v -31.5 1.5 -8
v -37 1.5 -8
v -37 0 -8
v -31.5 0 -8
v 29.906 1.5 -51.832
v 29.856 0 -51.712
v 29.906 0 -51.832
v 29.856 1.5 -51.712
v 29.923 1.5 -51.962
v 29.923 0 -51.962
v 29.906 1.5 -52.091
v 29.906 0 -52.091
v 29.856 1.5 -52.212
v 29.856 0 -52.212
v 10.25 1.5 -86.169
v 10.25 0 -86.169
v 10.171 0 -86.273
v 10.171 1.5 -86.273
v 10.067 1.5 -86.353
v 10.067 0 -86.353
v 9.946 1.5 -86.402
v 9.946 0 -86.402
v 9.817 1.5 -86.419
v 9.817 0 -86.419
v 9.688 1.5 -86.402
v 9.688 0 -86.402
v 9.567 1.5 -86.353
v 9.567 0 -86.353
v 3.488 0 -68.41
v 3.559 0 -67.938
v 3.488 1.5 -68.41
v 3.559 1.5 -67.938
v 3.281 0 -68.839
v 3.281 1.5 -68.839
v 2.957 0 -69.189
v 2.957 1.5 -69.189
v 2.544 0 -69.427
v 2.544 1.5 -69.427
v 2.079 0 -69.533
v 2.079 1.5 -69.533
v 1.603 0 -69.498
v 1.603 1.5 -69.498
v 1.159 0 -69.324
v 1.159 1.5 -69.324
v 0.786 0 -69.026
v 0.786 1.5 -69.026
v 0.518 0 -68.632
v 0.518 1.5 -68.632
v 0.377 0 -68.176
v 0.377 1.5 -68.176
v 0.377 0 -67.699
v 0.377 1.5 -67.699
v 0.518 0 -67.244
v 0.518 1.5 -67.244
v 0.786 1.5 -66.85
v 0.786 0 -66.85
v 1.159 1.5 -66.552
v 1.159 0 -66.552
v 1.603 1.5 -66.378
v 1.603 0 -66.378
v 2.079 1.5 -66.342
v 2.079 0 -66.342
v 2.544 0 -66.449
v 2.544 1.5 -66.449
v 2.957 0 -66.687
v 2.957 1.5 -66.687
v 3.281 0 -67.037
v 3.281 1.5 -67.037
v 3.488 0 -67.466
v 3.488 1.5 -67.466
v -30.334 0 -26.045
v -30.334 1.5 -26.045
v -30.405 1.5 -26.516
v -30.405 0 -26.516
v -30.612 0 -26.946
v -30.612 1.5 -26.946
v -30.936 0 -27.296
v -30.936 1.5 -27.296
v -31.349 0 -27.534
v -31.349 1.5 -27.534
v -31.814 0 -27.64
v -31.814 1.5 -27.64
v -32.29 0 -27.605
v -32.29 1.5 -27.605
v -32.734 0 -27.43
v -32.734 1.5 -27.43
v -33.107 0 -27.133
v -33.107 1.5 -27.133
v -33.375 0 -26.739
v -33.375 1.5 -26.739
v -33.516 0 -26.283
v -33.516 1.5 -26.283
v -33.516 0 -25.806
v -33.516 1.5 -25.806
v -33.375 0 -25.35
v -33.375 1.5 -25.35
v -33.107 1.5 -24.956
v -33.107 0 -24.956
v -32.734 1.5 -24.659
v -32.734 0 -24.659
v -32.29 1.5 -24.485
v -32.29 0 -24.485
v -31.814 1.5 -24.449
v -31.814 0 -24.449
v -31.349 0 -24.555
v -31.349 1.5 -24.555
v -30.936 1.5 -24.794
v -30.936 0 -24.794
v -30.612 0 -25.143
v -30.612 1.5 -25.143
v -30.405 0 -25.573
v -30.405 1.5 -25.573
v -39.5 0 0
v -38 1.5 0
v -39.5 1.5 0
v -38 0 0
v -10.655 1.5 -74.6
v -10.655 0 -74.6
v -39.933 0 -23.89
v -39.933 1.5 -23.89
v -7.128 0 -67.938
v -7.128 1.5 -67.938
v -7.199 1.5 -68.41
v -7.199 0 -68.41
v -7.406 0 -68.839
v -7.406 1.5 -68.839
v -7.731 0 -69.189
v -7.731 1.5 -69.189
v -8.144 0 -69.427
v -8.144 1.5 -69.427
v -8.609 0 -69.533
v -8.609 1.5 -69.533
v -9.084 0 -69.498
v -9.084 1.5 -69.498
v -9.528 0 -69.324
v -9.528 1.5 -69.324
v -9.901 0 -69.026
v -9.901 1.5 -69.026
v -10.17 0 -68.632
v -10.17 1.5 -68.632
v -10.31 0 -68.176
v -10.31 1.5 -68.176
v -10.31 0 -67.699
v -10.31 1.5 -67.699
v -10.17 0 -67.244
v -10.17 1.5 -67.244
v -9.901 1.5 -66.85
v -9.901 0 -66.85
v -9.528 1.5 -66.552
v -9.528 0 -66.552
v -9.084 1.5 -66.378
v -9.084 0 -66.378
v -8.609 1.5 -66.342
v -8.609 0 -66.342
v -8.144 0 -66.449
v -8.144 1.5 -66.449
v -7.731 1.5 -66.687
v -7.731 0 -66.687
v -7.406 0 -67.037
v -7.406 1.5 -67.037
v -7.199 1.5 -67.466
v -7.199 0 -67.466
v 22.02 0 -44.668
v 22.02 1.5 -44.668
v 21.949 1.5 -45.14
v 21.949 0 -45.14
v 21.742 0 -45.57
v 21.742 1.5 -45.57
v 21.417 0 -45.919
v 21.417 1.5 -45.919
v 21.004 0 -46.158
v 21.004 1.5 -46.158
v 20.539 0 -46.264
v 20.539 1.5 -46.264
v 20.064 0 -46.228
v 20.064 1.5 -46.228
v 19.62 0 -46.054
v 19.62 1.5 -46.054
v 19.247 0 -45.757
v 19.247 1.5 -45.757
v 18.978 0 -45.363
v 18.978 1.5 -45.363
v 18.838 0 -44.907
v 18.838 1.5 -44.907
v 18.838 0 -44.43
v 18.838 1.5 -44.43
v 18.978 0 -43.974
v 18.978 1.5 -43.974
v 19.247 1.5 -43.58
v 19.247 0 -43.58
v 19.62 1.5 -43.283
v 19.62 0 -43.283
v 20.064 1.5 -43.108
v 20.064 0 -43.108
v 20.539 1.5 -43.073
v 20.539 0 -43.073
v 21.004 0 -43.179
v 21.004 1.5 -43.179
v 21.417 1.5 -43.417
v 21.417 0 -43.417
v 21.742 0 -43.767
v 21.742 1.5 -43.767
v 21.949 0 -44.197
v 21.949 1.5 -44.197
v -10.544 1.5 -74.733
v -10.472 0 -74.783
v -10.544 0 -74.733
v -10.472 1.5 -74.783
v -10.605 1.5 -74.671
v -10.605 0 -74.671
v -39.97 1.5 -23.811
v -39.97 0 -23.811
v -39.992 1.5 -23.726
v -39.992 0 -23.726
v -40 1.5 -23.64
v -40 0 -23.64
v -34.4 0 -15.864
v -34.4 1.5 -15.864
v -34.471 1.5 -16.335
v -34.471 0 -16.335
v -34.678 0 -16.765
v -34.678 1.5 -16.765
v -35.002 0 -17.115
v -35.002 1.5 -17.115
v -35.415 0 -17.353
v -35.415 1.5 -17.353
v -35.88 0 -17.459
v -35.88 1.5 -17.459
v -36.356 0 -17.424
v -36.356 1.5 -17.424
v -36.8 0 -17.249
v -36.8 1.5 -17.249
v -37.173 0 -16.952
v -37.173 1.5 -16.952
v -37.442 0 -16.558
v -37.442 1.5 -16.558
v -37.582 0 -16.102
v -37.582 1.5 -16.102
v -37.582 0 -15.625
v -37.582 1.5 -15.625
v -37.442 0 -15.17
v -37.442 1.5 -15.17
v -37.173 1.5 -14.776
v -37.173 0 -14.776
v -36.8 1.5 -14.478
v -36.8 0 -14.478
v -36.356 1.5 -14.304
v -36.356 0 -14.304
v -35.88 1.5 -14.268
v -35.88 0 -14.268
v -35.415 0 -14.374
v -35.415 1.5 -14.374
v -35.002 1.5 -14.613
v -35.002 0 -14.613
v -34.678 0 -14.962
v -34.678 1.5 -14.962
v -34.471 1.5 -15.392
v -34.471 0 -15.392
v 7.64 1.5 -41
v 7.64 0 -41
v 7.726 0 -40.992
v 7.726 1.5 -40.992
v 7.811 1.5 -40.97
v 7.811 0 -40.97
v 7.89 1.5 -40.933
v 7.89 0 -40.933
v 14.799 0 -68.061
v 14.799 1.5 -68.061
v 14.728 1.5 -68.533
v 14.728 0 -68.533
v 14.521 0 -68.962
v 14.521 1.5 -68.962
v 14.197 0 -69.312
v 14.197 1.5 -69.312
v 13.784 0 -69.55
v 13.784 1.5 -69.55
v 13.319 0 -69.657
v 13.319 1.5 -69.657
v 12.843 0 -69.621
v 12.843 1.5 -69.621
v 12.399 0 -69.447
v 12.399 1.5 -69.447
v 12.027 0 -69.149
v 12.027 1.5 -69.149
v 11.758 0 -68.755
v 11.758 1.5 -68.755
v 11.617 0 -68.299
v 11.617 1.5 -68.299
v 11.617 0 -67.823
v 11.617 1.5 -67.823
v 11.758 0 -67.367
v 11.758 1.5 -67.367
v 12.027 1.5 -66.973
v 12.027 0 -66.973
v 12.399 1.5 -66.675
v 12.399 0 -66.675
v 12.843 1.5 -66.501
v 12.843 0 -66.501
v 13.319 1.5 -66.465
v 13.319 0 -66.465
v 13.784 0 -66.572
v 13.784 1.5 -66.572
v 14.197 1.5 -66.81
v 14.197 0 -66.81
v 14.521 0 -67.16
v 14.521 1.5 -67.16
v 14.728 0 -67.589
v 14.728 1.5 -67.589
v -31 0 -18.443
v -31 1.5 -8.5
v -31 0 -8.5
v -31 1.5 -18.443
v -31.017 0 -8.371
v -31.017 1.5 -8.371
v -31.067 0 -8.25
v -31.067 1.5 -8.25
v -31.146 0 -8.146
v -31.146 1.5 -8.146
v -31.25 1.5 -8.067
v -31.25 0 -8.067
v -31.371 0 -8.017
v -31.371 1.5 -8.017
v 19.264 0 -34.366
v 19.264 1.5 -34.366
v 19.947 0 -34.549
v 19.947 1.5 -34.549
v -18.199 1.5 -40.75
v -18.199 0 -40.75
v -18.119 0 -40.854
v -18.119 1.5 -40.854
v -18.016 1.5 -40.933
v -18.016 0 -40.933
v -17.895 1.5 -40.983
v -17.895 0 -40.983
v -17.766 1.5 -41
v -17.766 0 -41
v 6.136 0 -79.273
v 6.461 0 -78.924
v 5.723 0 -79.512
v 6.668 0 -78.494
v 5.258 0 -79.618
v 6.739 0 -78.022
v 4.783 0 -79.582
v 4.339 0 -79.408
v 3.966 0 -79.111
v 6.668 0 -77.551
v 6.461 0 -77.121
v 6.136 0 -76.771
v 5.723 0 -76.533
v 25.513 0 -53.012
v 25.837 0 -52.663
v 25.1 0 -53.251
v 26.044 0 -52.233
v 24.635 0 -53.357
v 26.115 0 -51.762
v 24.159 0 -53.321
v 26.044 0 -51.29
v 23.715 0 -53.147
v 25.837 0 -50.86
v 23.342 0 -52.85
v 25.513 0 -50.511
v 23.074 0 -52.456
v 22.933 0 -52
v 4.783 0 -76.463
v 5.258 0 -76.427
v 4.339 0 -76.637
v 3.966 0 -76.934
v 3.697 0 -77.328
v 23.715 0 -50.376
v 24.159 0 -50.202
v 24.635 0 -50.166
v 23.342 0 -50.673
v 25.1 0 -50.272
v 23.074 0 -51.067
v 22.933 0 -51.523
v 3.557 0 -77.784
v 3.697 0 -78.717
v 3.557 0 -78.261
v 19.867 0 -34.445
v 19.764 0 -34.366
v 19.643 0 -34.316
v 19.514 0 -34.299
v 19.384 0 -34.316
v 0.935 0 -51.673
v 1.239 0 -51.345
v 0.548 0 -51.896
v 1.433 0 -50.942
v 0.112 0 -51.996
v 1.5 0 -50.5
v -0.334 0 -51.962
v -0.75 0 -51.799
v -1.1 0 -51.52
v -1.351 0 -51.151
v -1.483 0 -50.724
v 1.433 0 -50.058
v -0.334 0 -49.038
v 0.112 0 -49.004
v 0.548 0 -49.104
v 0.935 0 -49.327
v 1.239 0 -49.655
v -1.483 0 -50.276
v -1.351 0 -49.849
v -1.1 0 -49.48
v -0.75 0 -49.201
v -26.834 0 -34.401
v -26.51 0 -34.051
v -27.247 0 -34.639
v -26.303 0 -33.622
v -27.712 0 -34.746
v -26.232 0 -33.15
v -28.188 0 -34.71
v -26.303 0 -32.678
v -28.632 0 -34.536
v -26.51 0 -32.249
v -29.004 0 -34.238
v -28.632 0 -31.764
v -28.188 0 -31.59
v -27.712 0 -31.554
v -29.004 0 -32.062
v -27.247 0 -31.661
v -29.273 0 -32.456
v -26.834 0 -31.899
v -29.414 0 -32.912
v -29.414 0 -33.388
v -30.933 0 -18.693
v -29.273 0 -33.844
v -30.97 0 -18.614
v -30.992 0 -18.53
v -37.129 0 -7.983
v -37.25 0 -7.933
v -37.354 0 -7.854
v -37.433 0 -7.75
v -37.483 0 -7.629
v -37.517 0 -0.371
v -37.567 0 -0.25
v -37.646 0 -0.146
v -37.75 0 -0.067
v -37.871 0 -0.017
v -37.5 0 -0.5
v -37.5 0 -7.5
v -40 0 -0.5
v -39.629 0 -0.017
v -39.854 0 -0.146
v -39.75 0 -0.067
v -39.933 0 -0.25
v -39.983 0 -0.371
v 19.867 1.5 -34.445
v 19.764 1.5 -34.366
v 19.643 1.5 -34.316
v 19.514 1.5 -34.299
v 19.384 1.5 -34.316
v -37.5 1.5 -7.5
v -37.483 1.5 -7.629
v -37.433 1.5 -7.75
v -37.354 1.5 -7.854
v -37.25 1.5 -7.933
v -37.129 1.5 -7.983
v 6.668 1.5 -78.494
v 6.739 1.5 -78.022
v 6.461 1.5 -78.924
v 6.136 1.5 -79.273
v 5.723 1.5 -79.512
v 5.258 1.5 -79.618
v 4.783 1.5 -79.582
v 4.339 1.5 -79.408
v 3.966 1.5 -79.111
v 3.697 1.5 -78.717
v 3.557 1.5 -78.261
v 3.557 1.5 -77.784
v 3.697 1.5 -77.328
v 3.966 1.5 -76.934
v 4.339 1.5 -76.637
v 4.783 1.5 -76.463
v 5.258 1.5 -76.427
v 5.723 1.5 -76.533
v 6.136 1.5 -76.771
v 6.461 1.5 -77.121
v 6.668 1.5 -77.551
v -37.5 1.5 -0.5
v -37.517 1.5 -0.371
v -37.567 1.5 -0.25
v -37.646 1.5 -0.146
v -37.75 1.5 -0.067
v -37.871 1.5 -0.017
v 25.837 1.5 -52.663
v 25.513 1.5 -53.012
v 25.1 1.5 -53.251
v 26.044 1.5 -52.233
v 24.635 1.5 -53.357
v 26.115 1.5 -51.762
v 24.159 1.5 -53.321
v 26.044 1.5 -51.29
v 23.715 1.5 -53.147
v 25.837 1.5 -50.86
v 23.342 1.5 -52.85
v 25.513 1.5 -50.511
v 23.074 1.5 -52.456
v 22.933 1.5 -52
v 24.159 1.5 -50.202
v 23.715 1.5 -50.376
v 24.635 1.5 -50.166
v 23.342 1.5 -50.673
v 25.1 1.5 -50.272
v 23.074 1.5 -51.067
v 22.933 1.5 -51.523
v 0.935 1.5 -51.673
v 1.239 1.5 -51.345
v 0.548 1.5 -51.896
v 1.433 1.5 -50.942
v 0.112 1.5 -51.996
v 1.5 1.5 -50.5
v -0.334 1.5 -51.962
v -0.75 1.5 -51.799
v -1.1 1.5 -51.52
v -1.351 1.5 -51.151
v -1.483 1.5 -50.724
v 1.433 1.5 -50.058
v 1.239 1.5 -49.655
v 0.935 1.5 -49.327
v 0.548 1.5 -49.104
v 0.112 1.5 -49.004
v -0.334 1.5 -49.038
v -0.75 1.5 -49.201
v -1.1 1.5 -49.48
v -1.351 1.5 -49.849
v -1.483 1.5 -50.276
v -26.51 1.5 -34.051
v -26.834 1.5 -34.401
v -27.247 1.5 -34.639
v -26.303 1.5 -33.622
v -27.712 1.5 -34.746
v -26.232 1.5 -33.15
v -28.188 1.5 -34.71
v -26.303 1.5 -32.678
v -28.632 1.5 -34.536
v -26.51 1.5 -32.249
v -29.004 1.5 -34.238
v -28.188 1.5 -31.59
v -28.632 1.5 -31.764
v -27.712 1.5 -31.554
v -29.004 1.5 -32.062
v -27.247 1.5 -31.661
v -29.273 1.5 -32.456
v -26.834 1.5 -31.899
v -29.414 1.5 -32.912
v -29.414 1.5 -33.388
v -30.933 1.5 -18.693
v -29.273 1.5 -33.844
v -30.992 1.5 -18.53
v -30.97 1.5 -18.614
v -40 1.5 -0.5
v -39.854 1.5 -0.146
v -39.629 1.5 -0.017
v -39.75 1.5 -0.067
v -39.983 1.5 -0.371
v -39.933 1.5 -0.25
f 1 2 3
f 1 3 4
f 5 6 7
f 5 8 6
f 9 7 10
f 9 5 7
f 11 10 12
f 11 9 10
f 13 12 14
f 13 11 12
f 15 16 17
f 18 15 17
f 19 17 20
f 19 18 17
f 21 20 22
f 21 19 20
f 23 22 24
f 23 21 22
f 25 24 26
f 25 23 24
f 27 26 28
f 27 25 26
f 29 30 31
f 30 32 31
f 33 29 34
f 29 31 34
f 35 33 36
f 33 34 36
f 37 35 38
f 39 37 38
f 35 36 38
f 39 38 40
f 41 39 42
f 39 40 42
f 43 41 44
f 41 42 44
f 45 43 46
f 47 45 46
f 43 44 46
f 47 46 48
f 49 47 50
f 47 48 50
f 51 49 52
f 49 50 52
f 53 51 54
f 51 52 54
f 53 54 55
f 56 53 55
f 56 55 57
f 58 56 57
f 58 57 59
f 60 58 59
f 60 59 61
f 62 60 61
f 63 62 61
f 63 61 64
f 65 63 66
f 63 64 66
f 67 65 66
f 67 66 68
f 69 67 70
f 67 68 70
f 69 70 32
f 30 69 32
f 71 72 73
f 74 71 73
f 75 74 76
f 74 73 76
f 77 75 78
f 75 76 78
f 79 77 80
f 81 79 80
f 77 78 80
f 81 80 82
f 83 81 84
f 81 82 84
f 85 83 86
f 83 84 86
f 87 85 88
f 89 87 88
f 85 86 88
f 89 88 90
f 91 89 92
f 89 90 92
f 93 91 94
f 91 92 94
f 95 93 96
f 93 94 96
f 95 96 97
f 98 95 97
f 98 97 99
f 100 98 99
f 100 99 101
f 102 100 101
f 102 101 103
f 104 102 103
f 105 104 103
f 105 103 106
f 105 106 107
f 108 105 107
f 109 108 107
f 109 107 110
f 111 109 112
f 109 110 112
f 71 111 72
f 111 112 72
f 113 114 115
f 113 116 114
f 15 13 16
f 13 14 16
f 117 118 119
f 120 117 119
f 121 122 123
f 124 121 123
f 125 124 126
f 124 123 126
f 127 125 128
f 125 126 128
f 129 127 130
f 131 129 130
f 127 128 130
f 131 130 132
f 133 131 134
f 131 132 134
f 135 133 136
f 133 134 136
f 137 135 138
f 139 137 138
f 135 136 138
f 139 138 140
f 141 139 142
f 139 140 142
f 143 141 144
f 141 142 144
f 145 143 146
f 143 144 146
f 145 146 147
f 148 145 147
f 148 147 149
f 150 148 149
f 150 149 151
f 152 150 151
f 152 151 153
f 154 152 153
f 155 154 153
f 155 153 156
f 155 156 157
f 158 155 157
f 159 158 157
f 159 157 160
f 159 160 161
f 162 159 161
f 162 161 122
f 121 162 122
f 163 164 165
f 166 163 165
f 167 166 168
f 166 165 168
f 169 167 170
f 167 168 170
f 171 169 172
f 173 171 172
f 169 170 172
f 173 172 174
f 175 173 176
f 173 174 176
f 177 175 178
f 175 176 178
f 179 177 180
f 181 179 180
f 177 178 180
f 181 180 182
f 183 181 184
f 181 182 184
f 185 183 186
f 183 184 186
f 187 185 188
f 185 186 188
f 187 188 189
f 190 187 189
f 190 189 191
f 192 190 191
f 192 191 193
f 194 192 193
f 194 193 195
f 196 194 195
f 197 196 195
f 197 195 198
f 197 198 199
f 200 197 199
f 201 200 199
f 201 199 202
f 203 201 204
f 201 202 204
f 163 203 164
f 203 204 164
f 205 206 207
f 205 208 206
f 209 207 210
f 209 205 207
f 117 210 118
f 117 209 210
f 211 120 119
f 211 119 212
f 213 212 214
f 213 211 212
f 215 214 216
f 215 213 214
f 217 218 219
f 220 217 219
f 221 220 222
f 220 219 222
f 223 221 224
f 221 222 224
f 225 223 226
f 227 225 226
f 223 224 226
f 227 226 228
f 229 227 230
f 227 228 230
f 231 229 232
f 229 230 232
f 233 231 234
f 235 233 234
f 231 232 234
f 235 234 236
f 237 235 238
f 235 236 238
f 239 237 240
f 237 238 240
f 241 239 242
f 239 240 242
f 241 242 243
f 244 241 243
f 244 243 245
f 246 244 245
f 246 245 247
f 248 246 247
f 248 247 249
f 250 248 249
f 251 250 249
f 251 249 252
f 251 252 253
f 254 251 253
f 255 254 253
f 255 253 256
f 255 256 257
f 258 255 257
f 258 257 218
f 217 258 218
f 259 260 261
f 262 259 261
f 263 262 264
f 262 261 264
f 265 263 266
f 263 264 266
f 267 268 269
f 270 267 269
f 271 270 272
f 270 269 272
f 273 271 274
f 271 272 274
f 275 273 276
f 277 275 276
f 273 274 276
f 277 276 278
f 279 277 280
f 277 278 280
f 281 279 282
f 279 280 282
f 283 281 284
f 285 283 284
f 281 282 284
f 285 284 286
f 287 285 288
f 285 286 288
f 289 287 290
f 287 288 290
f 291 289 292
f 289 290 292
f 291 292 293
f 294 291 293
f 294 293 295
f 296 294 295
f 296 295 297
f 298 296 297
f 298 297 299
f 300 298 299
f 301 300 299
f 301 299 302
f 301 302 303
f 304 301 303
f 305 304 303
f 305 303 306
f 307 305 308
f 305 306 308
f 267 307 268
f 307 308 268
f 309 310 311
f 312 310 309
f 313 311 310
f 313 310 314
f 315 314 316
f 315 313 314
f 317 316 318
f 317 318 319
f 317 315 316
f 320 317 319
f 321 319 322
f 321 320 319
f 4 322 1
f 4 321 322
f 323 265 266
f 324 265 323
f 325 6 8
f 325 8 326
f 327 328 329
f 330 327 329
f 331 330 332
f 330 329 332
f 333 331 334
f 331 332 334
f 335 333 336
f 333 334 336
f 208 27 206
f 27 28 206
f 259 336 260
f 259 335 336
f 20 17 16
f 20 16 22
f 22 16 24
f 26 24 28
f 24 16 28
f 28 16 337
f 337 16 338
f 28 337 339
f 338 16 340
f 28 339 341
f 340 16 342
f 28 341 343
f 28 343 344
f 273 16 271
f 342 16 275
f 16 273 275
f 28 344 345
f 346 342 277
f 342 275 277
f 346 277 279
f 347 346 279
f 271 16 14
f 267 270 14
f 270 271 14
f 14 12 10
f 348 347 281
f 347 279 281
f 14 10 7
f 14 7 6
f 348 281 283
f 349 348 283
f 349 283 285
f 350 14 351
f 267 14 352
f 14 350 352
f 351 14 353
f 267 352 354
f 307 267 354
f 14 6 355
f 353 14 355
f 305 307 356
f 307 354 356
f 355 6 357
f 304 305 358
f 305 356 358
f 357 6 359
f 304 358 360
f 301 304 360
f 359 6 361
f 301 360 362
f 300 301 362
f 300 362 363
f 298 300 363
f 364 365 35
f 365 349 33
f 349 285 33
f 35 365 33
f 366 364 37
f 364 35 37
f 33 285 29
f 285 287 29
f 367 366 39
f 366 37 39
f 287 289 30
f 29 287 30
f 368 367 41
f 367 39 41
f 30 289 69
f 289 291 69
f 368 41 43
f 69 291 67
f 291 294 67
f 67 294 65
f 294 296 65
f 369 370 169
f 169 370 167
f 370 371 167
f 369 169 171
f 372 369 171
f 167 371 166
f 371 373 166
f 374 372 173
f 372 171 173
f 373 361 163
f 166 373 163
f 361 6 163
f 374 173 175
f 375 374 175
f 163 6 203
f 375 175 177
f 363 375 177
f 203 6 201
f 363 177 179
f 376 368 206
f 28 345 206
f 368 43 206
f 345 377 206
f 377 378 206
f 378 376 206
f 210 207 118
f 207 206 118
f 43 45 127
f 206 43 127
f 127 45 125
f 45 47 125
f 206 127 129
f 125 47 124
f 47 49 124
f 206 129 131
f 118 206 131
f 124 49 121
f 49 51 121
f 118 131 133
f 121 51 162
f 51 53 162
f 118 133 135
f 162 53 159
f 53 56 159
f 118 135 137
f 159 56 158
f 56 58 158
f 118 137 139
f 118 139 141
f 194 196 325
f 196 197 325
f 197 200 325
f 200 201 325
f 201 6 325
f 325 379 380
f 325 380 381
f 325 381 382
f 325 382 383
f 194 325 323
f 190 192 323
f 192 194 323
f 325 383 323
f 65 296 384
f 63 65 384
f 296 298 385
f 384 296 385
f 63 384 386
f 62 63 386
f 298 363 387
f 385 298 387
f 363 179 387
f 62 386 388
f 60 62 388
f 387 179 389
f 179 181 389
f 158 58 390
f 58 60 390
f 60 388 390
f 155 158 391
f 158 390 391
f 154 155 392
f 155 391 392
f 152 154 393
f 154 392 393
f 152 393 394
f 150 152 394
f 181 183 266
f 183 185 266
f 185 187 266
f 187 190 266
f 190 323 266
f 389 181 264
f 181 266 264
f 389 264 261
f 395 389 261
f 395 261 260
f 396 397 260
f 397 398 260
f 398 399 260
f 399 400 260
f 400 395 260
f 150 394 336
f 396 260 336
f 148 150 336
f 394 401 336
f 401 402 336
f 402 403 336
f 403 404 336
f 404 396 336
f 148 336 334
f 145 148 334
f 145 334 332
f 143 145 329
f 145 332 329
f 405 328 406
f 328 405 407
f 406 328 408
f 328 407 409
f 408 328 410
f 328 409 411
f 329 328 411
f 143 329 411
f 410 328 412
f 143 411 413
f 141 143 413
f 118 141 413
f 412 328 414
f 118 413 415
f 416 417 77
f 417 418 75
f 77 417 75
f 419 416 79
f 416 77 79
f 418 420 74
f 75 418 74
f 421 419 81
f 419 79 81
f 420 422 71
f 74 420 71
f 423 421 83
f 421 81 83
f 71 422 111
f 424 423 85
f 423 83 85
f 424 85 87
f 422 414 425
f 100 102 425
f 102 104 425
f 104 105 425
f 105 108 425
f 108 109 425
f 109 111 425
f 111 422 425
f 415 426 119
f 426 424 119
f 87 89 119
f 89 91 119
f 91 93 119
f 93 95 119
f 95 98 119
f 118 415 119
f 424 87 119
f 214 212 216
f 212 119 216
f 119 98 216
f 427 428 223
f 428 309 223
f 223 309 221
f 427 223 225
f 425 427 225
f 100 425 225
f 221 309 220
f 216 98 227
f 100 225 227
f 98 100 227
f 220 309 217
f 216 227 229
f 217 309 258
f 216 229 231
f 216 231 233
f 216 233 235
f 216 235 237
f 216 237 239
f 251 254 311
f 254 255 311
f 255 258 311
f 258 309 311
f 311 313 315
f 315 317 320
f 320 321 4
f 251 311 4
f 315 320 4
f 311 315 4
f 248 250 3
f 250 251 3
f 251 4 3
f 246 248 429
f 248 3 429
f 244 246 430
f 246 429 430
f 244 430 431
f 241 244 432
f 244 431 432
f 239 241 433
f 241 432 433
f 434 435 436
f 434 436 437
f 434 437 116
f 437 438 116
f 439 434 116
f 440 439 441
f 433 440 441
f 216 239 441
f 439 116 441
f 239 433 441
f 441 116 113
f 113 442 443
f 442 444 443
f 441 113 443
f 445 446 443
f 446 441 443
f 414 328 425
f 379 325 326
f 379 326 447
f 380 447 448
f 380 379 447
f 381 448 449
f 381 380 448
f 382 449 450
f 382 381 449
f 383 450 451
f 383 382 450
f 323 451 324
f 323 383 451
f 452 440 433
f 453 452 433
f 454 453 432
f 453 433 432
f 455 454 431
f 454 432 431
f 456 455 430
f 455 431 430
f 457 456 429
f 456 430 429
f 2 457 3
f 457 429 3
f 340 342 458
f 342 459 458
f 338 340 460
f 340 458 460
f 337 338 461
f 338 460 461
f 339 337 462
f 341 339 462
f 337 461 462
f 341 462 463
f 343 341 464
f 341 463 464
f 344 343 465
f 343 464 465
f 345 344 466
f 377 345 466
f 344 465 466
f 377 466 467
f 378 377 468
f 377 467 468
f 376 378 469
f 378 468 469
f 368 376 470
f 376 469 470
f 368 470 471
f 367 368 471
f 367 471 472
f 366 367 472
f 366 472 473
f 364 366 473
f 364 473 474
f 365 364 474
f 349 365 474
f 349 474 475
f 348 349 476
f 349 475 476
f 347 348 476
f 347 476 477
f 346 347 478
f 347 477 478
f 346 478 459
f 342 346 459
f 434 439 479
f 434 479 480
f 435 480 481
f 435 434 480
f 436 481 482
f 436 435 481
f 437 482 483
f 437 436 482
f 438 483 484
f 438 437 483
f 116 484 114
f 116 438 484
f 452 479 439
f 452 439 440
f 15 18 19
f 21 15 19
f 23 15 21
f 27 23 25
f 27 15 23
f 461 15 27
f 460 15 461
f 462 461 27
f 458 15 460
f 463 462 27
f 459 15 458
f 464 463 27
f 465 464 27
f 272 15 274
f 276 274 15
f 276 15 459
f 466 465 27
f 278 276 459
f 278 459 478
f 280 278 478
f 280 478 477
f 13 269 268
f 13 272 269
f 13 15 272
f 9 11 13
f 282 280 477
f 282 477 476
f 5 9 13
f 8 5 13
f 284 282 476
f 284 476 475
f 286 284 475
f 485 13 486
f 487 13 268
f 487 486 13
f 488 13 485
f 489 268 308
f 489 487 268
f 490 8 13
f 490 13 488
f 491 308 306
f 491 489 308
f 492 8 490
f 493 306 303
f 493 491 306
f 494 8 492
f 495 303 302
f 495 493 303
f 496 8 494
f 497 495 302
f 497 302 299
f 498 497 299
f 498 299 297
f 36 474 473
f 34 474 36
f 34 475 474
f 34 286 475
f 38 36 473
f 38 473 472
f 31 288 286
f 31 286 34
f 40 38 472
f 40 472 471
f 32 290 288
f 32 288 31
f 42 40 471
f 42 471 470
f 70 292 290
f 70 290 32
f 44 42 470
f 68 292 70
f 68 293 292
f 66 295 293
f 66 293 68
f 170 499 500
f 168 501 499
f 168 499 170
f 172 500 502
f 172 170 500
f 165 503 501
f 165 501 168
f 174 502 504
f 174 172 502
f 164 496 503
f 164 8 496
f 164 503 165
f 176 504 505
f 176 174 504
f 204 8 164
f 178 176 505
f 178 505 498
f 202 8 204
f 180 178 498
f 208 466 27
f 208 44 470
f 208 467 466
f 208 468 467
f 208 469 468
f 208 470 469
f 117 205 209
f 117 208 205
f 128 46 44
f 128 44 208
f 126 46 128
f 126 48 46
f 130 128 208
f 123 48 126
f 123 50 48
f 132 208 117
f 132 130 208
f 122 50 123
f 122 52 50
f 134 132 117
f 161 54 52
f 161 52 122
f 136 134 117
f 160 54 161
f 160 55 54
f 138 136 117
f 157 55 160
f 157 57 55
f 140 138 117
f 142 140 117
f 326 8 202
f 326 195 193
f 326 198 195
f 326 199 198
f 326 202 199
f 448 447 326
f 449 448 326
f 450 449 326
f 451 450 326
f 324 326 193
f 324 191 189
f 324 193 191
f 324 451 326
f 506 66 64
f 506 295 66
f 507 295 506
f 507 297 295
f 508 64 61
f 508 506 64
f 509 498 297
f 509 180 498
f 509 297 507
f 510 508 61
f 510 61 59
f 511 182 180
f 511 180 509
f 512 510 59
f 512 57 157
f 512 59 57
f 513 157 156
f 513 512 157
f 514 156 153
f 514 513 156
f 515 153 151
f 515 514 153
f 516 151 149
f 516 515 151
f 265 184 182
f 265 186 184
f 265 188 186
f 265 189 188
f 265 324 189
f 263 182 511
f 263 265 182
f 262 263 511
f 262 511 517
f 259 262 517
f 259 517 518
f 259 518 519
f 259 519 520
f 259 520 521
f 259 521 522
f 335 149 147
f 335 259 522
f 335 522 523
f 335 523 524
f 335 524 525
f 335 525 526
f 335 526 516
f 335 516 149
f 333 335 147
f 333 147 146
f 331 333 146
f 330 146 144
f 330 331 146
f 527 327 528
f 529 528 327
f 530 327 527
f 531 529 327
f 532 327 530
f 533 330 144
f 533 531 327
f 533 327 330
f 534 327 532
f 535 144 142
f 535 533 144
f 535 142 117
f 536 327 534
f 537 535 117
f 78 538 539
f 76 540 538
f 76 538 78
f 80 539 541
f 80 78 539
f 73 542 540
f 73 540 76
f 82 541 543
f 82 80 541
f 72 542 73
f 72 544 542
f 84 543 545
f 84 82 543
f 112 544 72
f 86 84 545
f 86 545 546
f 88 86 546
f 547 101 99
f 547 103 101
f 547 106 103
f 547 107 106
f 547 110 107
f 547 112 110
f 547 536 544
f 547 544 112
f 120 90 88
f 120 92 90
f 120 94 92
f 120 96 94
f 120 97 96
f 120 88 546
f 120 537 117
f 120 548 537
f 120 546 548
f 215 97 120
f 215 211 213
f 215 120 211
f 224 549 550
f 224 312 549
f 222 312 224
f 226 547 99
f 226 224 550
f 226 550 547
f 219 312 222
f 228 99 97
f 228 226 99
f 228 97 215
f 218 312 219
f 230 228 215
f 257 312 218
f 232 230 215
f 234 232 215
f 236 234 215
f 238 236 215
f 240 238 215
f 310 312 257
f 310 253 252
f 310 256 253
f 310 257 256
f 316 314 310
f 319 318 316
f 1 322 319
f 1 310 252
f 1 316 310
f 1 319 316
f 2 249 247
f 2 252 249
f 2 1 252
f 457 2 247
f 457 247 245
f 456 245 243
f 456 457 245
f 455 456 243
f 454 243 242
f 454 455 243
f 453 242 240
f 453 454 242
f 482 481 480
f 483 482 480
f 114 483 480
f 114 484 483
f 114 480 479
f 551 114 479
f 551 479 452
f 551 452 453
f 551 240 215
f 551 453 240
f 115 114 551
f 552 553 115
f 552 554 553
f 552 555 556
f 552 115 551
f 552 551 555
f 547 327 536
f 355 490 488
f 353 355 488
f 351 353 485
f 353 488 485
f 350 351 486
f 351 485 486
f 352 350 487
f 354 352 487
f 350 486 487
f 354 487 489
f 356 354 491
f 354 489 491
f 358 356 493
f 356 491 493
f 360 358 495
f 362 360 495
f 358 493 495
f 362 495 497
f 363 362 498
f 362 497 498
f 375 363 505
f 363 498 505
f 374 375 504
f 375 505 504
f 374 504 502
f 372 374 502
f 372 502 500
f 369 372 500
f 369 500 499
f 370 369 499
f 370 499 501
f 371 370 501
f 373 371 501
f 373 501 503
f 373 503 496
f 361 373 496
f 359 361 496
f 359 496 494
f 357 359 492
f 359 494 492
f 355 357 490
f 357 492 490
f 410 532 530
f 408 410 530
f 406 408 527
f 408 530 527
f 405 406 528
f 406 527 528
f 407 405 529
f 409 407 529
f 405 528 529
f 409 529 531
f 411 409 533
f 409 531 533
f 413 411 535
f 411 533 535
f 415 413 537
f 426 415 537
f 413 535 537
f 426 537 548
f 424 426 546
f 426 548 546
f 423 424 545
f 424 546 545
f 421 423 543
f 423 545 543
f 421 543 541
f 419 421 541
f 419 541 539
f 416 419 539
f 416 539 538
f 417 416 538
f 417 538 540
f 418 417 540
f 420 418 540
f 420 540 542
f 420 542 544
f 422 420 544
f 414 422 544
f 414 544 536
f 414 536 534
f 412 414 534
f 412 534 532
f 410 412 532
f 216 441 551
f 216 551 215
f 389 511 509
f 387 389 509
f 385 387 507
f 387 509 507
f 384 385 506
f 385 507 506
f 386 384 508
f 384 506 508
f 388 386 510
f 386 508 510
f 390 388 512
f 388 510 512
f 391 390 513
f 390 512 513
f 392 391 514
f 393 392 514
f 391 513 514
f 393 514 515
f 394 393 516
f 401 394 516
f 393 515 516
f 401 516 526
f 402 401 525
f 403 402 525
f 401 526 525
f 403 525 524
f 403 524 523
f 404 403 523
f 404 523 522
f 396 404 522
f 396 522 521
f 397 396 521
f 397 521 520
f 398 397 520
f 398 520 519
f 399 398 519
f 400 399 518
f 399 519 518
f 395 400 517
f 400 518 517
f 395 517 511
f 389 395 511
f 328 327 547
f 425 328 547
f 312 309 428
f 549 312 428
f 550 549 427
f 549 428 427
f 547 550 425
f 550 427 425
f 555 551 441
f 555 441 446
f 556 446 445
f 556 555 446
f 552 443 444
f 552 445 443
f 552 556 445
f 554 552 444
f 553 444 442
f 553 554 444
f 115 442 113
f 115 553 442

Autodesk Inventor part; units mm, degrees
ref_plane "YZ Plane" through (0, 0, 0) normal (1, 0, 0) x (0, 1, 0)
ref_plane "XZ Plane" through (0, 0, 0) normal (0, 1, 0) x (-1, 0, 0)
ref_plane "XY Plane" through (0, 0, 0) normal (0, 0, 1) x (1, 0, 0)
sketch "スケッチ2" plane through (0, 0, 0) normal (0, 1, 0) x (-1, 0, 0)
  line L0 (0, 0) -> (40, 0)
  line L1 (40, 0) -> (40, -23.7735)
  line L2 (-30, -51.9615) -> (0, 0)
  line L3 (-30, -51.9615) -> (-10, -86.6025)
  line L4 (-10, -86.6025) -> (10.5885, -74.7158)
  line L5 (10.5885, -74.7158) -> (40, -23.7735)
  line L6 (-30, -51.9615) -> (-36.3397, -48.3013) construction
  line L7 (30, 0) -> (30, -18) construction
  line L8 (30, -18) -> (40, -23.7735) construction
  dimension "d0" = 60
  dimension "d1" = 60
  dimension "d2" = 40
  dimension "d3" = 60
  dimension "d4" = 18
  dimension "d5" = 30
  dimension "d6" = 60
extrude "プレート1" add sketch "スケッチ2" along normal blind 1.5
sketch "スケッチ3" plane through (0, 1.5, 0) normal (0, 1, 0) x (1, 0, 0)
  line L0 (-10.5885, 74.7158) -> (-40, 23.7735) projected
  line L1 (-31.7863, 38) -> (10.9697, 38)
  line L2 (10.9697, 38) -> (19.1969, 33.25)
  line L3 (0, 0) -> (30, 51.9615) projected
  line L4 (30, 51.9615) -> (0, 0) projected
  line L5 (0, 0) -> (-40, 0) projected
  circle A0 centre (0, 50.5) radius 12.5 construction
  circle A1 centre (0, 50.5) radius 1.5
  circle A2 centre (0, 50.5) radius 10.5 construction
  circle A3 centre (5.9346, 70.644) radius 10.5 construction
  circle A4 centre (5.9346, 70.644) radius 11.5 construction
  line L6 (10, 86.6025) -> (30, 51.9615) projected
  circle A5 centre (5.9346, 70.644) radius 1.5
  line L7 (-30, 0) -> (-30, 18)
  line L8 (-30, 18) -> (-18.453, 38)
  line L9 (-40, 23.7735) -> (-10.5885, 74.7158) projected
  line L10 (-40, 23.7735) -> (-40, 0) projected
  line L11 (-40, 23.7735) -> (-30, 18)
  line L12 (-31, 0) -> (-31, 18.5774)
  line L13 (-18.0543, 41) -> (-31, 18.5774)
  line L14 (-18.0543, 41) -> (7.7735, 41)
  line L15 (7.7735, 41) -> (19.6969, 34.116)
  circle A6 centre (0, 50.5) radius 9 construction
  line L16 (-29.7656, 59.5) -> (9, 59.5)
  line L17 (9, 59.5) -> (9, 41.5) construction
  line L18 (9, 41.5) -> (-29.7656, 41.5)
  line L19 (-29.7656, 41.5) -> (-29.7656, 59.5)
  line L20 (-29.7656, 41.5) -> (-19.3733, 59.5)
  line L21 (0, 59.5) -> (0, 41.5)
  dimension "d8" = 38
  dimension "d9" = 9.5
  dimension "d10" = 25
  dimension "d11" = 3
  dimension "d14" = 21
  dimension "d15" = 21
  dimension "d16" = 23
  dimension "d17" = 3
  dimension "d18" = 30
  dimension "d19" = 18
  dimension "d21" = 1
  dimension "d22" = 3
  dimension "d23" = 1
  dimension "d24" = 18
extrude "切り取り1" cut sketch "スケッチ3" against normal blind 1.5 contours L21 A1 | A1 L21 | L13 L14 L15 L3 L2 L1 | L1 L8 L11 L13 | L11 L7 L5 L12 | L1 L2 L3 L5 L7 L8
sketch "スケッチ4" plane through (0, 1.5, 0) normal (0, 1, 0) x (1, 0, 0)
  circle A0 centre (5.1388, 78.0224) radius 1.6 projected
  line L0 (14.0853, 64.5965) -> (11.5853, 60.2663) projected
  circle A1 centre (13.1994, 68.061) radius 1.6 projected
  circle A2 centre (-36, 15.8638) radius 1.6 projected
  circle A3 centre (20.4199, 44.6683) radius 1.6 projected
  circle A4 centre (24.5152, 51.7615) radius 1.6 projected
  circle A5 centre (-27.8315, 33.15) radius 1.6 projected
  circle A6 centre (-31.9338, 26.0447) radius 1.6 projected
  circle A7 centre (-8.7282, 67.9379) radius 1.6 projected
  circle A8 centre (1.9592, 67.9379) radius 1.6 projected
  line L1 (-31, 18.5774) -> (-31, 0) projected
  line L2 (-31, 0) -> (-37.5, 0)
  line L3 (-37.5, 0) -> (-37.5, 8)
  line L4 (-37.5, 8) -> (-31, 8)
  line L5 (-31, 8) -> (-31, 0)
  line L6 (-40, 0) -> (-40, 23.7735) projected
  point P0 (0, 0)
  dimension "d29" = 8
  dimension "d30" = 2.5
extrude "切り取り2" cut sketch "スケッチ4" against normal blind 1.5
fillet "フィレット1" radius 0.5 12 edges at (10, 0.75, -86.6025) (30, 0.75, -51.9615) (-10.5885, 0.75, -74.7158) (-40, 0.75, -23.7735) (-40, 0.75, 0) (-37.5, 0.75, 0) (-37.5, 0.75, -8) (-31, 0.75, -8) (-31, 0.75, -18.5774) (-18.0543, 0.75, -41) (7.7735, 0.75, -41) (19.6969, 0.75, -34.116)
equation "\"d1\" = d0"
equation "\"d12\" = Thickness"
equation "\"d25\" = Thickness"
equation "\"d7\" = Thickness"
equation "\"Thickness\" = 1.5"
properties part number "base_cover" material "アルミニウム 6061"
